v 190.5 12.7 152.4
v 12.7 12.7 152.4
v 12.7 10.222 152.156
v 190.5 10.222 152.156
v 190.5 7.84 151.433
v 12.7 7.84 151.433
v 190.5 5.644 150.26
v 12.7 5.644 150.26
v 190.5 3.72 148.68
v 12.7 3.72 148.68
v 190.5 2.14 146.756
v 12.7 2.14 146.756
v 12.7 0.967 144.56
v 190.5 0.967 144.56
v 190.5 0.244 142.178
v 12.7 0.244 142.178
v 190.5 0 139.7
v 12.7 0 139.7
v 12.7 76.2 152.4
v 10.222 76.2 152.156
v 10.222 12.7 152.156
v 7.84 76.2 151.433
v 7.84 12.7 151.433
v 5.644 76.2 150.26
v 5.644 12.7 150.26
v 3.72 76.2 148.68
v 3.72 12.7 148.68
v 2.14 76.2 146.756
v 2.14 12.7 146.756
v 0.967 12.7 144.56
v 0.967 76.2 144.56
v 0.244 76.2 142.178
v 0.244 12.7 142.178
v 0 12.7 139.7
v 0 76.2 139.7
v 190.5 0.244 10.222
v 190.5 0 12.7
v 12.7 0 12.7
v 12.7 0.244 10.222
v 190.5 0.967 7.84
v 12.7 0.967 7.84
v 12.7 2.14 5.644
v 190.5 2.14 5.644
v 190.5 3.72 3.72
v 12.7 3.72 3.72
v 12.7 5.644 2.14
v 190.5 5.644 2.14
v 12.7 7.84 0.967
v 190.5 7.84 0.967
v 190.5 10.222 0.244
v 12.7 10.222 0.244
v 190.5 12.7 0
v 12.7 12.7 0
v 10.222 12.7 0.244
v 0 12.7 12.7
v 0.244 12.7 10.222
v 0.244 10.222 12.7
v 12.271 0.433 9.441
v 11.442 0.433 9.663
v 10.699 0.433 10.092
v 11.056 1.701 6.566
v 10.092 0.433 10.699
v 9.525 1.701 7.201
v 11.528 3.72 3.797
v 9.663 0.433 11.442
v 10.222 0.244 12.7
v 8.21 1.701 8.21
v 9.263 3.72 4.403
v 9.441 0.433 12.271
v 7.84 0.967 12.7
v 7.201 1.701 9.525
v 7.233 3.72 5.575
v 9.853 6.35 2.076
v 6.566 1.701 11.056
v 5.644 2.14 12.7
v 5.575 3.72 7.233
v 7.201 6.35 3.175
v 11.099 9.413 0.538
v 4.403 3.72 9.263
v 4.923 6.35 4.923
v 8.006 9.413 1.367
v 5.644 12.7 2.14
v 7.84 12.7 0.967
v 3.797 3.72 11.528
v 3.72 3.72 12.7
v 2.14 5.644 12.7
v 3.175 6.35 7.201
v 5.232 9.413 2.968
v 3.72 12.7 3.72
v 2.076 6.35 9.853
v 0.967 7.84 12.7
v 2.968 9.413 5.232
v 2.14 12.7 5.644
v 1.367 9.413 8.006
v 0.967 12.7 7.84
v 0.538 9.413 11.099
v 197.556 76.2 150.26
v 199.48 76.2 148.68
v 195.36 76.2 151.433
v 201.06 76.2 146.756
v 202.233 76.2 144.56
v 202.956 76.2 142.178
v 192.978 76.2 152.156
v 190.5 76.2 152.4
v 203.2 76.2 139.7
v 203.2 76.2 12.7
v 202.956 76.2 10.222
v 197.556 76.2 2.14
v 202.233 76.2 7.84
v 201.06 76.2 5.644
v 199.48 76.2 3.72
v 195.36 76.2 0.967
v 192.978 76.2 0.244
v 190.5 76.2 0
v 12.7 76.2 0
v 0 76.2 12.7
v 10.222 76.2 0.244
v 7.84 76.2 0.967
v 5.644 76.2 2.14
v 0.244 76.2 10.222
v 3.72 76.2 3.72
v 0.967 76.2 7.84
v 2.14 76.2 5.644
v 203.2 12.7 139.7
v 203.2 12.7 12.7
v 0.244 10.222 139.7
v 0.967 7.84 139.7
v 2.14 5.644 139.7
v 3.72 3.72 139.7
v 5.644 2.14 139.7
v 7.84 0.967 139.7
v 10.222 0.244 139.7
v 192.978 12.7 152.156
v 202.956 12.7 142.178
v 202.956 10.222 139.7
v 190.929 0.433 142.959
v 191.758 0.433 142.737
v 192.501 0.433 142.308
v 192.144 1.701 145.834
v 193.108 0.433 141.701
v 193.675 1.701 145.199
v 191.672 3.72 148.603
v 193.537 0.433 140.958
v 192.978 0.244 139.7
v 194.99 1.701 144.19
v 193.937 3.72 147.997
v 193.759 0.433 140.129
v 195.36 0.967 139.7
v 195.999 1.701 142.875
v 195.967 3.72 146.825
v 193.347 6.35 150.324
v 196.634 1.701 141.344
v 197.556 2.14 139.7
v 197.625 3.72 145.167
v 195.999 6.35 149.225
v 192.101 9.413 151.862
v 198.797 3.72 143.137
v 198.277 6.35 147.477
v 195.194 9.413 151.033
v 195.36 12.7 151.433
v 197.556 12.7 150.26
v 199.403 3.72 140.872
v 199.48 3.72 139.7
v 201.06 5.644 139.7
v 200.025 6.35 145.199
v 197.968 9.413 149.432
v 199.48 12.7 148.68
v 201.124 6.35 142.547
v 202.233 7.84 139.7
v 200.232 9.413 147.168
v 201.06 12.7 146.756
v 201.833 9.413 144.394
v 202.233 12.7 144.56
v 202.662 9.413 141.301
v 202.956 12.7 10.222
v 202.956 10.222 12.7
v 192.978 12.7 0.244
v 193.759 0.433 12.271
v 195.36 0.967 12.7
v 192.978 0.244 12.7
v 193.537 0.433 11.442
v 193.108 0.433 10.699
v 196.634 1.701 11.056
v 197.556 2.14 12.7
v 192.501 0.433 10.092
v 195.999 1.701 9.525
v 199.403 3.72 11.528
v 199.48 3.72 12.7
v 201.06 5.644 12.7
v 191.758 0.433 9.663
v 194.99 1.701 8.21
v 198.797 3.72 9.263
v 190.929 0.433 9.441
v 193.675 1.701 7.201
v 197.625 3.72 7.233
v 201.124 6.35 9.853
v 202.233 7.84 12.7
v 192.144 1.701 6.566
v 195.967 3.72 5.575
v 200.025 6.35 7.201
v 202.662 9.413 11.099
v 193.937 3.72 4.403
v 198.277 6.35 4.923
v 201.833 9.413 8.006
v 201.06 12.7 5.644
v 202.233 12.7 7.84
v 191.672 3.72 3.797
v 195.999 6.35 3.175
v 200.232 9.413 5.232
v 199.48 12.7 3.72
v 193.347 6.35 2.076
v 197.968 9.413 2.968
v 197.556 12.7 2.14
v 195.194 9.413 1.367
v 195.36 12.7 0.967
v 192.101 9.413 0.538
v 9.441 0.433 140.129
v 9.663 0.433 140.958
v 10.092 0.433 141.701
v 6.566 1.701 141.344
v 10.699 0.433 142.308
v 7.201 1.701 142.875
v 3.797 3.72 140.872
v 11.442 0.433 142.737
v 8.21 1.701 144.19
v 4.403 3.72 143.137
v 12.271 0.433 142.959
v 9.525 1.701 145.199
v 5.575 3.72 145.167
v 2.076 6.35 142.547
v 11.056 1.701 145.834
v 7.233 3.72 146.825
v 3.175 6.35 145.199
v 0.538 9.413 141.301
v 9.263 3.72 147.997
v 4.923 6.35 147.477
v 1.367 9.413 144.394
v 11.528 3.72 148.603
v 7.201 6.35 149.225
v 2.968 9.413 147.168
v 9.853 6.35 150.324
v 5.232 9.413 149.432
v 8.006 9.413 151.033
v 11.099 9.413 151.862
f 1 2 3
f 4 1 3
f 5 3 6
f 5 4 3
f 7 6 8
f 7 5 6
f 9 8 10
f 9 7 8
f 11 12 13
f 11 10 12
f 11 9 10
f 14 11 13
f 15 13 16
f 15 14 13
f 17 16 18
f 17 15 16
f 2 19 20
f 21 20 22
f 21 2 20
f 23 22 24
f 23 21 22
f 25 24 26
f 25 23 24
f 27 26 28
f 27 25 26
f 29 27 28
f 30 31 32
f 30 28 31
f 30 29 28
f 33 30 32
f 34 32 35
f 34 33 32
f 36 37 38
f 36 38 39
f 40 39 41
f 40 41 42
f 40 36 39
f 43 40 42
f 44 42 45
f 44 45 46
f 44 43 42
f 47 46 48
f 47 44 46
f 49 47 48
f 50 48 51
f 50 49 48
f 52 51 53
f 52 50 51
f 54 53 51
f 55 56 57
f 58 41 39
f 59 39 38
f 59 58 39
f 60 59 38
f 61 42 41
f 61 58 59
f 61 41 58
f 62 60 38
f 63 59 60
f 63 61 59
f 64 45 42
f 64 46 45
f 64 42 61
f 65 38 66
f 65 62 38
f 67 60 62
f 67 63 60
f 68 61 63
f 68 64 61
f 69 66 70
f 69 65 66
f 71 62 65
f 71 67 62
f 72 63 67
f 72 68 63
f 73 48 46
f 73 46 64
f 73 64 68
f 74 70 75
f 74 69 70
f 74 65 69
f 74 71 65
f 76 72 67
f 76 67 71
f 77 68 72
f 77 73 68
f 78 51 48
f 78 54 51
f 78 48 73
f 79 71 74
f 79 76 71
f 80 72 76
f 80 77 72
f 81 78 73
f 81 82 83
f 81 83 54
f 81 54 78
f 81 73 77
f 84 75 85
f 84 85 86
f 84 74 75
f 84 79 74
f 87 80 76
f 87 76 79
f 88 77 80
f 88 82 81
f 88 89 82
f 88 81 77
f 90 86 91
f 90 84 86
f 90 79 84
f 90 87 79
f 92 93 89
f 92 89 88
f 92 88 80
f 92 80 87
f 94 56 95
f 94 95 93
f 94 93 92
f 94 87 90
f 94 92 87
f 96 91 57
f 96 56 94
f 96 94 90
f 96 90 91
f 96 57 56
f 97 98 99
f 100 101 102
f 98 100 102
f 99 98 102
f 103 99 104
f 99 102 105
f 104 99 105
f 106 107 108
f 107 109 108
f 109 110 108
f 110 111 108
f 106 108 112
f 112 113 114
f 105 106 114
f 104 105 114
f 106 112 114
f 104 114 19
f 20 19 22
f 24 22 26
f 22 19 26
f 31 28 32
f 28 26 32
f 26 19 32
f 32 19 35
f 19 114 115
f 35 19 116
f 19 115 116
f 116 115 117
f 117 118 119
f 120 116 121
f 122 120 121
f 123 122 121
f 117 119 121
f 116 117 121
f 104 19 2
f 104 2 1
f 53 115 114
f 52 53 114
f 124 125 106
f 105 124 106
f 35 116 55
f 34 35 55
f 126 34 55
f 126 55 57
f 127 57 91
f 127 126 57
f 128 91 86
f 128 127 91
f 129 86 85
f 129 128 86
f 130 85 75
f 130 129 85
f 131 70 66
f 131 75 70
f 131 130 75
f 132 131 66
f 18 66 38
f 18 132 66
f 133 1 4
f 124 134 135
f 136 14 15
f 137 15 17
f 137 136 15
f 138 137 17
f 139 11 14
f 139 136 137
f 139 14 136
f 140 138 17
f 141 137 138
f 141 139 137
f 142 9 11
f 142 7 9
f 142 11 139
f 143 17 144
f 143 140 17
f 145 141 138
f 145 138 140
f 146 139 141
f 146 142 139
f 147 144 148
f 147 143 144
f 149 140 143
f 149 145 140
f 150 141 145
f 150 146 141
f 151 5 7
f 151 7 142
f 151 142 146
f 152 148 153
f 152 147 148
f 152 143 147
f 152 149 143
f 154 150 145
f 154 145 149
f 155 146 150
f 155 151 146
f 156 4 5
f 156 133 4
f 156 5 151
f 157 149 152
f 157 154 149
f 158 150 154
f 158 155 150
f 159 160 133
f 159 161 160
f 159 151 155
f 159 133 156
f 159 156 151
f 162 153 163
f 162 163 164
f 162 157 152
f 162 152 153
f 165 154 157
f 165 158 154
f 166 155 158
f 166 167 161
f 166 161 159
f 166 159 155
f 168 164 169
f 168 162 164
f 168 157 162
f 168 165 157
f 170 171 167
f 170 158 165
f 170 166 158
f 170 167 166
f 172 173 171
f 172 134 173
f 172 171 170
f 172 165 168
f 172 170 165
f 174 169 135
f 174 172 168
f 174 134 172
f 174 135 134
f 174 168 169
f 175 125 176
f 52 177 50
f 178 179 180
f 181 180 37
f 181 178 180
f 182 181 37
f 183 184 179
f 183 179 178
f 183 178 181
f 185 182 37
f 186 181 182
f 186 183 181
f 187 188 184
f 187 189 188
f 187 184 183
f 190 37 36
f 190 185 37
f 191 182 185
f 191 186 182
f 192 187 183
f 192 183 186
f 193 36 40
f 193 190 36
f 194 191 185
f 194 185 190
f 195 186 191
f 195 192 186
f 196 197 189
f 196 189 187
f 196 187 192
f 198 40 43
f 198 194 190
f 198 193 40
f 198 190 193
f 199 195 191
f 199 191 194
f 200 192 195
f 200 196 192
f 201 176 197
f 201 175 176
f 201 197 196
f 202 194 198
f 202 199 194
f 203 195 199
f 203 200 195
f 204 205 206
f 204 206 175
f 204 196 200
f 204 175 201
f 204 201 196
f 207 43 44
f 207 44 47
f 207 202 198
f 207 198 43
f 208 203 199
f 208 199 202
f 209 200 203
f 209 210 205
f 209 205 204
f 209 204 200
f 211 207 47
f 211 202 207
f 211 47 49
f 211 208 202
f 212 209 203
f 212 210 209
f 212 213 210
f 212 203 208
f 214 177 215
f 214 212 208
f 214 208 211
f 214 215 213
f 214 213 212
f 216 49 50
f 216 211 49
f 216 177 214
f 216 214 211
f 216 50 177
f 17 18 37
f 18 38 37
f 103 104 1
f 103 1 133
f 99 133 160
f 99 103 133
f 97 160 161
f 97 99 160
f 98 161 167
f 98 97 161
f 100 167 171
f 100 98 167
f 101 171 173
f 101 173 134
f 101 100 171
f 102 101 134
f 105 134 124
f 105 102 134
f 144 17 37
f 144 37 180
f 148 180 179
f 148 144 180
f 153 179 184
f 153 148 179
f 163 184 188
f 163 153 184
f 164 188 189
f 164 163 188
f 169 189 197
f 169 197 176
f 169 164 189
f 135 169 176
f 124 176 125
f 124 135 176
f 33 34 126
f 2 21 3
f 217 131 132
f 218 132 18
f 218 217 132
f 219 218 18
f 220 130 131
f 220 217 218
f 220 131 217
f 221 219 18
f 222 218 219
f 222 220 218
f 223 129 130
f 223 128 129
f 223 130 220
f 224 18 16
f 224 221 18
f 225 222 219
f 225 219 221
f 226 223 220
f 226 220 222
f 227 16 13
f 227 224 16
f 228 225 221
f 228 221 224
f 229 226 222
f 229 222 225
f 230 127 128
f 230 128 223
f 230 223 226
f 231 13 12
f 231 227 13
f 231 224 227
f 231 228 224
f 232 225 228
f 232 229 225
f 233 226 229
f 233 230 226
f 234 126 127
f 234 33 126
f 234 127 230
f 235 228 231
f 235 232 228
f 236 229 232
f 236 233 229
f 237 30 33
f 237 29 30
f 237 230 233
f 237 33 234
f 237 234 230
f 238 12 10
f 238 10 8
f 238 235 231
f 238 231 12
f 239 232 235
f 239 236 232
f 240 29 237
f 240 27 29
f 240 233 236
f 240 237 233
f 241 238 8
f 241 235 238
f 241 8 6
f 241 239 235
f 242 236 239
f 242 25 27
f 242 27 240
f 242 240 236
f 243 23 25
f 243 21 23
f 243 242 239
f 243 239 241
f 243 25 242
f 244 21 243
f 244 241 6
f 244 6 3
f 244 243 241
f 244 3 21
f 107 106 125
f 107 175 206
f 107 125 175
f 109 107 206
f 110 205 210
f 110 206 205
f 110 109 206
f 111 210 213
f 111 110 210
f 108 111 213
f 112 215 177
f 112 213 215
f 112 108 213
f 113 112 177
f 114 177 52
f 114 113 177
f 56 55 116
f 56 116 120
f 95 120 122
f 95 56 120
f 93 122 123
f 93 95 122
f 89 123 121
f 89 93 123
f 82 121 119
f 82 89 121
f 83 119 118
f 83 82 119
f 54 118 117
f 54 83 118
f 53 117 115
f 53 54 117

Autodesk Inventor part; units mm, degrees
ref_plane "YZ Plane" through (0, 0, 0) normal (1, 0, 0) x (0, 1, 0)
ref_plane "XZ Plane" through (0, 0, 0) normal (0, 1, 0) x (-1, 0, 0)
ref_plane "XY Plane" through (0, 0, 0) normal (0, 0, 1) x (1, 0, 0)
sketch "Sketch1" plane through (0, 0, 0) normal (0, 1, 0) x (-1, 0, 0)
  point P0 (0, 0)
sketch "Sketch2" plane through (0, 0, 0) normal (0, 0, 1) x (1, 0, 0)
  line L0 (0, 0) -> (203.2, 0)
  line L1 (203.2, 0) -> (203.2, 76.2)
  line L2 (203.2, 76.2) -> (0, 76.2)
  line L3 (0, 76.2) -> (0, 0)
  dimension "d0" = 203.2
  dimension "d1" = 76.2
extrude "Extrusion1" add sketch "Sketch2" along normal blind 152.4
fillet "Fillet1" radius 12.7 8 edges at (0, 38.1, 152.4) (203.2, 38.1, 152.4) (203.2, 38.1, 0) (0, 38.1, 0) (0, 0, 76.2) (101.6, 0, 152.4) (101.6, 0, 0) (203.2, 0, 76.2)
properties part number "electronicsbay"
